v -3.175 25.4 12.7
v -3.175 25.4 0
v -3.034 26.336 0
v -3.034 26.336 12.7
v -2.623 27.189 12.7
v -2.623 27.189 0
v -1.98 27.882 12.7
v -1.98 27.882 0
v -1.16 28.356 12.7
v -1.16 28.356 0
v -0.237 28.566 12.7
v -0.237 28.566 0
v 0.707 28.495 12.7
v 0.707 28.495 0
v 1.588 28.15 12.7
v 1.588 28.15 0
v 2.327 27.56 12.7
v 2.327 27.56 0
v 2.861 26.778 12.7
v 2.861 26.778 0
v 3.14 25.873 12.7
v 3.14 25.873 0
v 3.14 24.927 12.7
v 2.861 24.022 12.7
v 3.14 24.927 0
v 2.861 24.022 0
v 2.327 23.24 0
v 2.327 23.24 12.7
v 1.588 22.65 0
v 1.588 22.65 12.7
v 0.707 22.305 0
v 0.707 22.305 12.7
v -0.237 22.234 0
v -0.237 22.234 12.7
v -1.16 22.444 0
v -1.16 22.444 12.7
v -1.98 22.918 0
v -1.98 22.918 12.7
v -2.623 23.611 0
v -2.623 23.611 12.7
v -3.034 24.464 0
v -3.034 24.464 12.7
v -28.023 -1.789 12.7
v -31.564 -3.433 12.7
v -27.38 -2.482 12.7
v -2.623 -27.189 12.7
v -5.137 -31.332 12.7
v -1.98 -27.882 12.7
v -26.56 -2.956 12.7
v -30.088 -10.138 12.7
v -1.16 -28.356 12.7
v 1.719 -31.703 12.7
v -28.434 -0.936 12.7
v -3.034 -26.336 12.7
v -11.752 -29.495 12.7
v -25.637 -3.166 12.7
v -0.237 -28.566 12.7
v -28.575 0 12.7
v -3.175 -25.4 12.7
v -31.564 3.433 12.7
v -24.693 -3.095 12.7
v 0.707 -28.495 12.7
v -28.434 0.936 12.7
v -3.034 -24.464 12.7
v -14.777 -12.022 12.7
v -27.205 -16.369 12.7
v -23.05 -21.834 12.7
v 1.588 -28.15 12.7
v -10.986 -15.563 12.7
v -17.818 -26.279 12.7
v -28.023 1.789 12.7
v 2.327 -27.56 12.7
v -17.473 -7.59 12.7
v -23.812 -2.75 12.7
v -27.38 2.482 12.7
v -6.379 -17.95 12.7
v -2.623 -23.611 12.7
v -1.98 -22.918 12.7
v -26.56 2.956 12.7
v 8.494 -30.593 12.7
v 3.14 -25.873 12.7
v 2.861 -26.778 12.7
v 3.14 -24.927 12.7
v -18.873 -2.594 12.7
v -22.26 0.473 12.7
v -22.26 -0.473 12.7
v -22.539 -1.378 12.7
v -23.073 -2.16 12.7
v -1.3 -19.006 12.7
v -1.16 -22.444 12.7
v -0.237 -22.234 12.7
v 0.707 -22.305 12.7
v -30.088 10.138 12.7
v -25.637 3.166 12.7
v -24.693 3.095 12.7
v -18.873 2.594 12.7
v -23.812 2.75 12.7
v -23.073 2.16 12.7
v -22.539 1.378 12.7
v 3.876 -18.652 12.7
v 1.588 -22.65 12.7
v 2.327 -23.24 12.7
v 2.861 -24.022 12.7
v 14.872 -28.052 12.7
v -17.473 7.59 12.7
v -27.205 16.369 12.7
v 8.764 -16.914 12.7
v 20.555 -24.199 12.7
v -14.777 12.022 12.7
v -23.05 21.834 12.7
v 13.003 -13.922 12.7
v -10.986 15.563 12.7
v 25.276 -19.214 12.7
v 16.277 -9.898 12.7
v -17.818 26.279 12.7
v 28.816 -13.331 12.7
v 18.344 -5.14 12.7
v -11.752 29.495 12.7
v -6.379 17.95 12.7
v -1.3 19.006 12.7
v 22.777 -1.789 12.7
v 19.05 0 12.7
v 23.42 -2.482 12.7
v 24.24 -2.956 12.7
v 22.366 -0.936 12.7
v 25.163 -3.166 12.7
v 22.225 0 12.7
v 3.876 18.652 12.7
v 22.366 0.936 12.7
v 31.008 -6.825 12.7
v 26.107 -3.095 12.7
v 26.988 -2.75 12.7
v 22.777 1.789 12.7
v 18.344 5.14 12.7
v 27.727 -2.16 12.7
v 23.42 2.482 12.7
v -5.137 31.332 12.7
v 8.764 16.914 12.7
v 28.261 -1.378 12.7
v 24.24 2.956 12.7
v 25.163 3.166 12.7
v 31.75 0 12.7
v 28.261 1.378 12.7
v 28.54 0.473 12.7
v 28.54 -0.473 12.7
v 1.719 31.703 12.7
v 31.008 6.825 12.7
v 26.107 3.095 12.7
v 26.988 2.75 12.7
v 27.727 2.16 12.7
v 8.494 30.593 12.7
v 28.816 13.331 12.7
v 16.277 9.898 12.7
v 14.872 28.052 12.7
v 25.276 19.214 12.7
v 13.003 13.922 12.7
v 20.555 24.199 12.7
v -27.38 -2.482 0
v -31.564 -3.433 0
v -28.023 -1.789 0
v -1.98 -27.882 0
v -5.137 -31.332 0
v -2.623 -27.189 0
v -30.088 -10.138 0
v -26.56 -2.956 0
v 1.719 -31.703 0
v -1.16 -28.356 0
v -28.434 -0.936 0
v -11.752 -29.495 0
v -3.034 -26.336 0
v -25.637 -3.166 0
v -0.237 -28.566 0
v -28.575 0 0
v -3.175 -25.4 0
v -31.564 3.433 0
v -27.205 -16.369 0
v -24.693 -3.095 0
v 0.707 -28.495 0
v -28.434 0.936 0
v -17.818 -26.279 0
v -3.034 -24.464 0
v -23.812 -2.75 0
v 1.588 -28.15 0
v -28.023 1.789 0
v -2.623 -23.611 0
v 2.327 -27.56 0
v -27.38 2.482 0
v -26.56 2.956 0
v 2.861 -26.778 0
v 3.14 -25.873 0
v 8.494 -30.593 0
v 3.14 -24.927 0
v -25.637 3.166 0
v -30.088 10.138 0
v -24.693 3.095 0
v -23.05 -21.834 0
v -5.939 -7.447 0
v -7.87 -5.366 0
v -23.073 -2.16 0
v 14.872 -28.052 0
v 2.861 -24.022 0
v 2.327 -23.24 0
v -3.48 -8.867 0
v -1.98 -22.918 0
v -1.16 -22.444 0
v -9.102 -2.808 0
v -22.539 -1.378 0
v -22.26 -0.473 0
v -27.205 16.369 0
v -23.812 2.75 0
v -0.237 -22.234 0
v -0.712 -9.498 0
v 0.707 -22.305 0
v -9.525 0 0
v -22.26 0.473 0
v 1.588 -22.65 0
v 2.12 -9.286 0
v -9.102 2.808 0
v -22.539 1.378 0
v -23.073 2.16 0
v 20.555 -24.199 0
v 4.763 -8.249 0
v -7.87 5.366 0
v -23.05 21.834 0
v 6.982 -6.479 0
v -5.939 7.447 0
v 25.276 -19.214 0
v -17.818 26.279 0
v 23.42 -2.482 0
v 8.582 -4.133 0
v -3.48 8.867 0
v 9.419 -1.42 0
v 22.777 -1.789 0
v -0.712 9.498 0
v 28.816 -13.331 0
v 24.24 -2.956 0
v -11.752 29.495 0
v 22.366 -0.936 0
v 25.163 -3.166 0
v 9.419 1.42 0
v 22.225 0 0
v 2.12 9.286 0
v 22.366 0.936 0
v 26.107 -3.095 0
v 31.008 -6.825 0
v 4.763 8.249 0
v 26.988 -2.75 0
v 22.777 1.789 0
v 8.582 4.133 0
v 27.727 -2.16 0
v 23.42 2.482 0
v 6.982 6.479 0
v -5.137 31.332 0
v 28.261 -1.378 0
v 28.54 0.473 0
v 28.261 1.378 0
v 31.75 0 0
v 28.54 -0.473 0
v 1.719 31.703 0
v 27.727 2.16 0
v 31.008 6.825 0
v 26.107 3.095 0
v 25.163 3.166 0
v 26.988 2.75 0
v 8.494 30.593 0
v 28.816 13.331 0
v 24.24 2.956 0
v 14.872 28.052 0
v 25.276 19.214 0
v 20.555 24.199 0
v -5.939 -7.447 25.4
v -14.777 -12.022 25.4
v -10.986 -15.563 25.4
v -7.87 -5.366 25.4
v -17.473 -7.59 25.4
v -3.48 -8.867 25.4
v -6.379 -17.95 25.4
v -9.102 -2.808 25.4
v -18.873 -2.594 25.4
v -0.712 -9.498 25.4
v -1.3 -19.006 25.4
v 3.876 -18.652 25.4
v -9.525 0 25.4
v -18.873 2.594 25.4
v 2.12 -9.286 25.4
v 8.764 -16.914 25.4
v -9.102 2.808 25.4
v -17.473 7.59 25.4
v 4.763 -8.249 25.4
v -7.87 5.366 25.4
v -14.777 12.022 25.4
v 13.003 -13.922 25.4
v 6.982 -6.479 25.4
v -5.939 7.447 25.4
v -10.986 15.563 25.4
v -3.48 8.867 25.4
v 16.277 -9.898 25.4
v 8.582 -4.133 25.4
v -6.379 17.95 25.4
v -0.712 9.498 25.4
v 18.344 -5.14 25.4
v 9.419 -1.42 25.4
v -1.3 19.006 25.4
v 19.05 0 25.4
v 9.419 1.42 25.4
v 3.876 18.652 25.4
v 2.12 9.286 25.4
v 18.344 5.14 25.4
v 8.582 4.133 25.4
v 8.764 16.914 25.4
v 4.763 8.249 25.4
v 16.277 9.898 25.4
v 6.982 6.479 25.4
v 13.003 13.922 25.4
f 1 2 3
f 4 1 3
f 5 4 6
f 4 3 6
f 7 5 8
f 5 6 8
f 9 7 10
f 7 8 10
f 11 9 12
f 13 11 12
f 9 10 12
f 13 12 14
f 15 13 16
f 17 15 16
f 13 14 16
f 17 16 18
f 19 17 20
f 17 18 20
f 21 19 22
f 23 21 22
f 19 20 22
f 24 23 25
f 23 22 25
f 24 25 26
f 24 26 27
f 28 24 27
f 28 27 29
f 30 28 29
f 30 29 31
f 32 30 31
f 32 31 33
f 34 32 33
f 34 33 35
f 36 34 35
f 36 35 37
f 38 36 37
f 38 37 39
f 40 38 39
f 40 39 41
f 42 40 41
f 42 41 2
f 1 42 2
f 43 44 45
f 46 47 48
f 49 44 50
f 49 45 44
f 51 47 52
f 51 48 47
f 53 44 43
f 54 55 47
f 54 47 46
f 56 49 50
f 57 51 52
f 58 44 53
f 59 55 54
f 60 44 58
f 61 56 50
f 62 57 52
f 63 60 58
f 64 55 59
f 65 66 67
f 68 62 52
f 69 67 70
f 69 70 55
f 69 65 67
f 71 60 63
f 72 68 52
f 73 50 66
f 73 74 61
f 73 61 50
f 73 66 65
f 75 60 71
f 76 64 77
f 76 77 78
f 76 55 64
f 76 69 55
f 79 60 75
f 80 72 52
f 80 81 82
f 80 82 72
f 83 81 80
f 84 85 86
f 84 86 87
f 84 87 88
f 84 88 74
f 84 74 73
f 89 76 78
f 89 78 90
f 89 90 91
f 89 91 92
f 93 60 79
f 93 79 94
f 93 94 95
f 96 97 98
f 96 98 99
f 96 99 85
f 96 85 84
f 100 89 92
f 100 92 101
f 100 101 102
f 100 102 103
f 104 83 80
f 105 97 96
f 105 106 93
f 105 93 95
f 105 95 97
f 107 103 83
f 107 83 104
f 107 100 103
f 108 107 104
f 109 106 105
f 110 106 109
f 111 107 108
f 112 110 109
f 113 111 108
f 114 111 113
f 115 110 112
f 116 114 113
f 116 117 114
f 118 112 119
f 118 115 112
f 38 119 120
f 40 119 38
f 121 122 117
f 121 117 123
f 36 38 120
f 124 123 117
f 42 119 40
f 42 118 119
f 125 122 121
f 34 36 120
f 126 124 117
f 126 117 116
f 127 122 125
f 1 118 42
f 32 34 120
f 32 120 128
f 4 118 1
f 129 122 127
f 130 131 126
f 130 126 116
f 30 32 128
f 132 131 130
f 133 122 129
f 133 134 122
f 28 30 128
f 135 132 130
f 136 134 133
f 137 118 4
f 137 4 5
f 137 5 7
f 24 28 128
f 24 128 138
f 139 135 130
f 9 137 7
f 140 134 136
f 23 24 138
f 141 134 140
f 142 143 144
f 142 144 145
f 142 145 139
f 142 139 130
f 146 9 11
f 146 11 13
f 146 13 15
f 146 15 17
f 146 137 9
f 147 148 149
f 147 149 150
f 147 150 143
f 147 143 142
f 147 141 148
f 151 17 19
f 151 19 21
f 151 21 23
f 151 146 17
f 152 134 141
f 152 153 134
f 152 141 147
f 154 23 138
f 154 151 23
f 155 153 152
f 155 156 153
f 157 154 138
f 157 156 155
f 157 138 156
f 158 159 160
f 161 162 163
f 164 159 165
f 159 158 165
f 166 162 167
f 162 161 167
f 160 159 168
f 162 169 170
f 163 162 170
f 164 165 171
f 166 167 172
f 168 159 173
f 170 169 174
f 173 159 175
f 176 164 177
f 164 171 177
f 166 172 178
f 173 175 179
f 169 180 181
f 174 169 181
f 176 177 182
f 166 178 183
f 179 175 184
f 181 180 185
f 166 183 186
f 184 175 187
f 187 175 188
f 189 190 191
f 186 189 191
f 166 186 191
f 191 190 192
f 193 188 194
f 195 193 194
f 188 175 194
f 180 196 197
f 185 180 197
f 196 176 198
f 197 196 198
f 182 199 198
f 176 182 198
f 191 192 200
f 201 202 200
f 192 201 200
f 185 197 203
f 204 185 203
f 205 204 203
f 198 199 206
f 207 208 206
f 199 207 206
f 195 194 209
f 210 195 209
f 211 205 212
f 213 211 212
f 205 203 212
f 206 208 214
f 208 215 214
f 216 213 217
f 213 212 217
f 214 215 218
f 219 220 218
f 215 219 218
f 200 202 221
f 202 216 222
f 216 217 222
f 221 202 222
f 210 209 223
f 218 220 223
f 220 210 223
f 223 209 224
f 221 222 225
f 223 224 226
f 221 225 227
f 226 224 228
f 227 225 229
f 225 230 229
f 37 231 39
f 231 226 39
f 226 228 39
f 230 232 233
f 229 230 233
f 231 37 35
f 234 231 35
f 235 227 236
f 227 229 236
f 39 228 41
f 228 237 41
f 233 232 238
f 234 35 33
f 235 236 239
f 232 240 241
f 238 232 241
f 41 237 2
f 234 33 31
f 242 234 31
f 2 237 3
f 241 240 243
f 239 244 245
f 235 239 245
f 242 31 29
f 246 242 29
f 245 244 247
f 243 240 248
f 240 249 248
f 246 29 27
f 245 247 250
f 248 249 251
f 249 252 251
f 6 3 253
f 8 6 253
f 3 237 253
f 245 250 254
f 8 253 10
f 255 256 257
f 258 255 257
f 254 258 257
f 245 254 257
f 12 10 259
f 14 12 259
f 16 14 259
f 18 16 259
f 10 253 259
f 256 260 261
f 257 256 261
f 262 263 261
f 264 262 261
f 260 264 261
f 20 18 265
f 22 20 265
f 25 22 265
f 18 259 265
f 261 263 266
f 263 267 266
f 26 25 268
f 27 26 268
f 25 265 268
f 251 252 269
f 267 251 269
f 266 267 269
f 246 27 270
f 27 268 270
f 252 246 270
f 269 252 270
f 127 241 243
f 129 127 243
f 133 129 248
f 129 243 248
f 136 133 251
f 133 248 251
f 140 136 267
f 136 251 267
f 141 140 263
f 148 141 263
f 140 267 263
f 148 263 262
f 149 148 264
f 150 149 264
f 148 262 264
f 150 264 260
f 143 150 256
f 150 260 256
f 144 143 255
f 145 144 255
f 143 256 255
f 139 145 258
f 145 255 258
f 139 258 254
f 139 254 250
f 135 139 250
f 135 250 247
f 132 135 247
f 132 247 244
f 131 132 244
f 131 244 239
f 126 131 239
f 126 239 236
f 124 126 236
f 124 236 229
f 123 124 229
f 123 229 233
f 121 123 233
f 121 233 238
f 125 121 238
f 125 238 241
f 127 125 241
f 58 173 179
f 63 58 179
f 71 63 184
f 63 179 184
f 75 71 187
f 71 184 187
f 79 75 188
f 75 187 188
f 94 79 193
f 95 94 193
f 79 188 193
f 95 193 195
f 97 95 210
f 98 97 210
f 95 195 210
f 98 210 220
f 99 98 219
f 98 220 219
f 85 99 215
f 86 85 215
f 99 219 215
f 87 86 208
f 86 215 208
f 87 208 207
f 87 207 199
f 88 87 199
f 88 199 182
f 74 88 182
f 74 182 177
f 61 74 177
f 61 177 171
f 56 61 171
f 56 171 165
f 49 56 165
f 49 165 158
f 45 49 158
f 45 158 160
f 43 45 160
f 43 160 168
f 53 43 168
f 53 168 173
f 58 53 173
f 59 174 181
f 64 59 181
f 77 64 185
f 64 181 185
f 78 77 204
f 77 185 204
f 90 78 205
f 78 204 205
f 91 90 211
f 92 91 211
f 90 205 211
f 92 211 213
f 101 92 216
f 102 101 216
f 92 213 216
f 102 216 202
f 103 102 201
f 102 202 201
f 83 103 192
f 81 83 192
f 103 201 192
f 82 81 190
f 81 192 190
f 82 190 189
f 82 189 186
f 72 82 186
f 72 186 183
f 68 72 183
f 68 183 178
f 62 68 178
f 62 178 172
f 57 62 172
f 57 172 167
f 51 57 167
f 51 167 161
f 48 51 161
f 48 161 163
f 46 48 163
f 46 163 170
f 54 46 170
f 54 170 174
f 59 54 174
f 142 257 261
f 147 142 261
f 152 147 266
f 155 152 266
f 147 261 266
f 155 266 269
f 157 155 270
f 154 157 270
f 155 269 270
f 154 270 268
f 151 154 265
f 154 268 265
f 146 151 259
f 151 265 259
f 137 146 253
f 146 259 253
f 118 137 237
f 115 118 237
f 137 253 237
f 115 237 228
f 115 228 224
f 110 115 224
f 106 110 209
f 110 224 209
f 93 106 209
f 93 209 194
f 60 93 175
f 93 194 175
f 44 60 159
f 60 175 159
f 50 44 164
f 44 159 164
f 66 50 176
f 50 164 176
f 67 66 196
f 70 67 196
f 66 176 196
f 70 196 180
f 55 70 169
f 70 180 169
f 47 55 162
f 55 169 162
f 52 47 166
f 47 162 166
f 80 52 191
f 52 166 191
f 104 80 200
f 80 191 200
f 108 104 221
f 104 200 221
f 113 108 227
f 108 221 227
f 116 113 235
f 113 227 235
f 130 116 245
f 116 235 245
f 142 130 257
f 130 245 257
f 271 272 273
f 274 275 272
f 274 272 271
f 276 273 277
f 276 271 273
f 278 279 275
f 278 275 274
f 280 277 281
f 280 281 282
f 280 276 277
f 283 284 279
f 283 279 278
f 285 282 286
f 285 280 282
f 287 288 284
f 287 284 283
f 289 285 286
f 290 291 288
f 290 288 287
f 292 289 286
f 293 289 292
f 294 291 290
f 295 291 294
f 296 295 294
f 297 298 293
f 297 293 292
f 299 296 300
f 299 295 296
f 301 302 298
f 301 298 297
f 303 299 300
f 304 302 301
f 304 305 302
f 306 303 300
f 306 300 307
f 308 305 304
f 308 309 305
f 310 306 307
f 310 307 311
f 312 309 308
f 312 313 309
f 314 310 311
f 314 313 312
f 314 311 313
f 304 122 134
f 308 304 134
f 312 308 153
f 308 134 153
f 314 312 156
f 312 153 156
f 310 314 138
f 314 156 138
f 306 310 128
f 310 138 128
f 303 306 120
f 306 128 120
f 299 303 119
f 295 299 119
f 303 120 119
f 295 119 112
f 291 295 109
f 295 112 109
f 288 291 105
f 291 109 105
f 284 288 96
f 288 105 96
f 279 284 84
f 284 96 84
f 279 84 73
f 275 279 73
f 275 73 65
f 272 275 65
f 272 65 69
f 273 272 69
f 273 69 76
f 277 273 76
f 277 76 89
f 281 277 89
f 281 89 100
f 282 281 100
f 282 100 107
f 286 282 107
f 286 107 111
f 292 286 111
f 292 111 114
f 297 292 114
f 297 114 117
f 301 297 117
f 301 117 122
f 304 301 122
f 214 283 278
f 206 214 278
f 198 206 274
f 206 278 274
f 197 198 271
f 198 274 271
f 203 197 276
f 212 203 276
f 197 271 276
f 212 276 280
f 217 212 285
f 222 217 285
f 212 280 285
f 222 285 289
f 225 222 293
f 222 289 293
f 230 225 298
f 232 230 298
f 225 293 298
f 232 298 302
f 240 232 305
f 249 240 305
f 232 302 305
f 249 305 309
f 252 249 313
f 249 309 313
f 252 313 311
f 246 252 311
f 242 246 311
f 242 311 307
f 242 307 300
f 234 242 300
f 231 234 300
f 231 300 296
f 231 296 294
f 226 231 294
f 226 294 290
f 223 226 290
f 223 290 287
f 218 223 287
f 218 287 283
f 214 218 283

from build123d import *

# Parameters (mm, degrees)
F0_R     = 31.75
F0_R_2   = 19.05
F1_DEPTH = 12.7
F2_DEPTH = 25.4
F3_D     = 19.05
F5_D     = 6.35


with BuildPart() as f1:
    # F0 (on Top) → F1 (new body)
    with BuildSketch(Plane.XY):
        Circle(F0_R)
        Circle(F0_R_2, mode=Mode.SUBTRACT)
    extrude(amount=F1_DEPTH)

    # F0 (on Top) → F2 (join)
    with BuildSketch(Plane.XY):
        Circle(F0_R_2)
    extrude(amount=F2_DEPTH)

    # F3 (through all)
    with Locations(Plane(origin=(0, 0, 0), x_dir=(1, 0, 0), z_dir=(0, 0, -1))):
        with Locations((0, 0)):
            Hole(F3_D / 2)

    # F5 (through all)
    with Locations(Plane.XY.offset(12.7)):
        with Locations((0, 25.4), (-25.4, 0), (0, -25.4), (25.4, 0)):
            Hole(F5_D / 2)


solid = f1.part
